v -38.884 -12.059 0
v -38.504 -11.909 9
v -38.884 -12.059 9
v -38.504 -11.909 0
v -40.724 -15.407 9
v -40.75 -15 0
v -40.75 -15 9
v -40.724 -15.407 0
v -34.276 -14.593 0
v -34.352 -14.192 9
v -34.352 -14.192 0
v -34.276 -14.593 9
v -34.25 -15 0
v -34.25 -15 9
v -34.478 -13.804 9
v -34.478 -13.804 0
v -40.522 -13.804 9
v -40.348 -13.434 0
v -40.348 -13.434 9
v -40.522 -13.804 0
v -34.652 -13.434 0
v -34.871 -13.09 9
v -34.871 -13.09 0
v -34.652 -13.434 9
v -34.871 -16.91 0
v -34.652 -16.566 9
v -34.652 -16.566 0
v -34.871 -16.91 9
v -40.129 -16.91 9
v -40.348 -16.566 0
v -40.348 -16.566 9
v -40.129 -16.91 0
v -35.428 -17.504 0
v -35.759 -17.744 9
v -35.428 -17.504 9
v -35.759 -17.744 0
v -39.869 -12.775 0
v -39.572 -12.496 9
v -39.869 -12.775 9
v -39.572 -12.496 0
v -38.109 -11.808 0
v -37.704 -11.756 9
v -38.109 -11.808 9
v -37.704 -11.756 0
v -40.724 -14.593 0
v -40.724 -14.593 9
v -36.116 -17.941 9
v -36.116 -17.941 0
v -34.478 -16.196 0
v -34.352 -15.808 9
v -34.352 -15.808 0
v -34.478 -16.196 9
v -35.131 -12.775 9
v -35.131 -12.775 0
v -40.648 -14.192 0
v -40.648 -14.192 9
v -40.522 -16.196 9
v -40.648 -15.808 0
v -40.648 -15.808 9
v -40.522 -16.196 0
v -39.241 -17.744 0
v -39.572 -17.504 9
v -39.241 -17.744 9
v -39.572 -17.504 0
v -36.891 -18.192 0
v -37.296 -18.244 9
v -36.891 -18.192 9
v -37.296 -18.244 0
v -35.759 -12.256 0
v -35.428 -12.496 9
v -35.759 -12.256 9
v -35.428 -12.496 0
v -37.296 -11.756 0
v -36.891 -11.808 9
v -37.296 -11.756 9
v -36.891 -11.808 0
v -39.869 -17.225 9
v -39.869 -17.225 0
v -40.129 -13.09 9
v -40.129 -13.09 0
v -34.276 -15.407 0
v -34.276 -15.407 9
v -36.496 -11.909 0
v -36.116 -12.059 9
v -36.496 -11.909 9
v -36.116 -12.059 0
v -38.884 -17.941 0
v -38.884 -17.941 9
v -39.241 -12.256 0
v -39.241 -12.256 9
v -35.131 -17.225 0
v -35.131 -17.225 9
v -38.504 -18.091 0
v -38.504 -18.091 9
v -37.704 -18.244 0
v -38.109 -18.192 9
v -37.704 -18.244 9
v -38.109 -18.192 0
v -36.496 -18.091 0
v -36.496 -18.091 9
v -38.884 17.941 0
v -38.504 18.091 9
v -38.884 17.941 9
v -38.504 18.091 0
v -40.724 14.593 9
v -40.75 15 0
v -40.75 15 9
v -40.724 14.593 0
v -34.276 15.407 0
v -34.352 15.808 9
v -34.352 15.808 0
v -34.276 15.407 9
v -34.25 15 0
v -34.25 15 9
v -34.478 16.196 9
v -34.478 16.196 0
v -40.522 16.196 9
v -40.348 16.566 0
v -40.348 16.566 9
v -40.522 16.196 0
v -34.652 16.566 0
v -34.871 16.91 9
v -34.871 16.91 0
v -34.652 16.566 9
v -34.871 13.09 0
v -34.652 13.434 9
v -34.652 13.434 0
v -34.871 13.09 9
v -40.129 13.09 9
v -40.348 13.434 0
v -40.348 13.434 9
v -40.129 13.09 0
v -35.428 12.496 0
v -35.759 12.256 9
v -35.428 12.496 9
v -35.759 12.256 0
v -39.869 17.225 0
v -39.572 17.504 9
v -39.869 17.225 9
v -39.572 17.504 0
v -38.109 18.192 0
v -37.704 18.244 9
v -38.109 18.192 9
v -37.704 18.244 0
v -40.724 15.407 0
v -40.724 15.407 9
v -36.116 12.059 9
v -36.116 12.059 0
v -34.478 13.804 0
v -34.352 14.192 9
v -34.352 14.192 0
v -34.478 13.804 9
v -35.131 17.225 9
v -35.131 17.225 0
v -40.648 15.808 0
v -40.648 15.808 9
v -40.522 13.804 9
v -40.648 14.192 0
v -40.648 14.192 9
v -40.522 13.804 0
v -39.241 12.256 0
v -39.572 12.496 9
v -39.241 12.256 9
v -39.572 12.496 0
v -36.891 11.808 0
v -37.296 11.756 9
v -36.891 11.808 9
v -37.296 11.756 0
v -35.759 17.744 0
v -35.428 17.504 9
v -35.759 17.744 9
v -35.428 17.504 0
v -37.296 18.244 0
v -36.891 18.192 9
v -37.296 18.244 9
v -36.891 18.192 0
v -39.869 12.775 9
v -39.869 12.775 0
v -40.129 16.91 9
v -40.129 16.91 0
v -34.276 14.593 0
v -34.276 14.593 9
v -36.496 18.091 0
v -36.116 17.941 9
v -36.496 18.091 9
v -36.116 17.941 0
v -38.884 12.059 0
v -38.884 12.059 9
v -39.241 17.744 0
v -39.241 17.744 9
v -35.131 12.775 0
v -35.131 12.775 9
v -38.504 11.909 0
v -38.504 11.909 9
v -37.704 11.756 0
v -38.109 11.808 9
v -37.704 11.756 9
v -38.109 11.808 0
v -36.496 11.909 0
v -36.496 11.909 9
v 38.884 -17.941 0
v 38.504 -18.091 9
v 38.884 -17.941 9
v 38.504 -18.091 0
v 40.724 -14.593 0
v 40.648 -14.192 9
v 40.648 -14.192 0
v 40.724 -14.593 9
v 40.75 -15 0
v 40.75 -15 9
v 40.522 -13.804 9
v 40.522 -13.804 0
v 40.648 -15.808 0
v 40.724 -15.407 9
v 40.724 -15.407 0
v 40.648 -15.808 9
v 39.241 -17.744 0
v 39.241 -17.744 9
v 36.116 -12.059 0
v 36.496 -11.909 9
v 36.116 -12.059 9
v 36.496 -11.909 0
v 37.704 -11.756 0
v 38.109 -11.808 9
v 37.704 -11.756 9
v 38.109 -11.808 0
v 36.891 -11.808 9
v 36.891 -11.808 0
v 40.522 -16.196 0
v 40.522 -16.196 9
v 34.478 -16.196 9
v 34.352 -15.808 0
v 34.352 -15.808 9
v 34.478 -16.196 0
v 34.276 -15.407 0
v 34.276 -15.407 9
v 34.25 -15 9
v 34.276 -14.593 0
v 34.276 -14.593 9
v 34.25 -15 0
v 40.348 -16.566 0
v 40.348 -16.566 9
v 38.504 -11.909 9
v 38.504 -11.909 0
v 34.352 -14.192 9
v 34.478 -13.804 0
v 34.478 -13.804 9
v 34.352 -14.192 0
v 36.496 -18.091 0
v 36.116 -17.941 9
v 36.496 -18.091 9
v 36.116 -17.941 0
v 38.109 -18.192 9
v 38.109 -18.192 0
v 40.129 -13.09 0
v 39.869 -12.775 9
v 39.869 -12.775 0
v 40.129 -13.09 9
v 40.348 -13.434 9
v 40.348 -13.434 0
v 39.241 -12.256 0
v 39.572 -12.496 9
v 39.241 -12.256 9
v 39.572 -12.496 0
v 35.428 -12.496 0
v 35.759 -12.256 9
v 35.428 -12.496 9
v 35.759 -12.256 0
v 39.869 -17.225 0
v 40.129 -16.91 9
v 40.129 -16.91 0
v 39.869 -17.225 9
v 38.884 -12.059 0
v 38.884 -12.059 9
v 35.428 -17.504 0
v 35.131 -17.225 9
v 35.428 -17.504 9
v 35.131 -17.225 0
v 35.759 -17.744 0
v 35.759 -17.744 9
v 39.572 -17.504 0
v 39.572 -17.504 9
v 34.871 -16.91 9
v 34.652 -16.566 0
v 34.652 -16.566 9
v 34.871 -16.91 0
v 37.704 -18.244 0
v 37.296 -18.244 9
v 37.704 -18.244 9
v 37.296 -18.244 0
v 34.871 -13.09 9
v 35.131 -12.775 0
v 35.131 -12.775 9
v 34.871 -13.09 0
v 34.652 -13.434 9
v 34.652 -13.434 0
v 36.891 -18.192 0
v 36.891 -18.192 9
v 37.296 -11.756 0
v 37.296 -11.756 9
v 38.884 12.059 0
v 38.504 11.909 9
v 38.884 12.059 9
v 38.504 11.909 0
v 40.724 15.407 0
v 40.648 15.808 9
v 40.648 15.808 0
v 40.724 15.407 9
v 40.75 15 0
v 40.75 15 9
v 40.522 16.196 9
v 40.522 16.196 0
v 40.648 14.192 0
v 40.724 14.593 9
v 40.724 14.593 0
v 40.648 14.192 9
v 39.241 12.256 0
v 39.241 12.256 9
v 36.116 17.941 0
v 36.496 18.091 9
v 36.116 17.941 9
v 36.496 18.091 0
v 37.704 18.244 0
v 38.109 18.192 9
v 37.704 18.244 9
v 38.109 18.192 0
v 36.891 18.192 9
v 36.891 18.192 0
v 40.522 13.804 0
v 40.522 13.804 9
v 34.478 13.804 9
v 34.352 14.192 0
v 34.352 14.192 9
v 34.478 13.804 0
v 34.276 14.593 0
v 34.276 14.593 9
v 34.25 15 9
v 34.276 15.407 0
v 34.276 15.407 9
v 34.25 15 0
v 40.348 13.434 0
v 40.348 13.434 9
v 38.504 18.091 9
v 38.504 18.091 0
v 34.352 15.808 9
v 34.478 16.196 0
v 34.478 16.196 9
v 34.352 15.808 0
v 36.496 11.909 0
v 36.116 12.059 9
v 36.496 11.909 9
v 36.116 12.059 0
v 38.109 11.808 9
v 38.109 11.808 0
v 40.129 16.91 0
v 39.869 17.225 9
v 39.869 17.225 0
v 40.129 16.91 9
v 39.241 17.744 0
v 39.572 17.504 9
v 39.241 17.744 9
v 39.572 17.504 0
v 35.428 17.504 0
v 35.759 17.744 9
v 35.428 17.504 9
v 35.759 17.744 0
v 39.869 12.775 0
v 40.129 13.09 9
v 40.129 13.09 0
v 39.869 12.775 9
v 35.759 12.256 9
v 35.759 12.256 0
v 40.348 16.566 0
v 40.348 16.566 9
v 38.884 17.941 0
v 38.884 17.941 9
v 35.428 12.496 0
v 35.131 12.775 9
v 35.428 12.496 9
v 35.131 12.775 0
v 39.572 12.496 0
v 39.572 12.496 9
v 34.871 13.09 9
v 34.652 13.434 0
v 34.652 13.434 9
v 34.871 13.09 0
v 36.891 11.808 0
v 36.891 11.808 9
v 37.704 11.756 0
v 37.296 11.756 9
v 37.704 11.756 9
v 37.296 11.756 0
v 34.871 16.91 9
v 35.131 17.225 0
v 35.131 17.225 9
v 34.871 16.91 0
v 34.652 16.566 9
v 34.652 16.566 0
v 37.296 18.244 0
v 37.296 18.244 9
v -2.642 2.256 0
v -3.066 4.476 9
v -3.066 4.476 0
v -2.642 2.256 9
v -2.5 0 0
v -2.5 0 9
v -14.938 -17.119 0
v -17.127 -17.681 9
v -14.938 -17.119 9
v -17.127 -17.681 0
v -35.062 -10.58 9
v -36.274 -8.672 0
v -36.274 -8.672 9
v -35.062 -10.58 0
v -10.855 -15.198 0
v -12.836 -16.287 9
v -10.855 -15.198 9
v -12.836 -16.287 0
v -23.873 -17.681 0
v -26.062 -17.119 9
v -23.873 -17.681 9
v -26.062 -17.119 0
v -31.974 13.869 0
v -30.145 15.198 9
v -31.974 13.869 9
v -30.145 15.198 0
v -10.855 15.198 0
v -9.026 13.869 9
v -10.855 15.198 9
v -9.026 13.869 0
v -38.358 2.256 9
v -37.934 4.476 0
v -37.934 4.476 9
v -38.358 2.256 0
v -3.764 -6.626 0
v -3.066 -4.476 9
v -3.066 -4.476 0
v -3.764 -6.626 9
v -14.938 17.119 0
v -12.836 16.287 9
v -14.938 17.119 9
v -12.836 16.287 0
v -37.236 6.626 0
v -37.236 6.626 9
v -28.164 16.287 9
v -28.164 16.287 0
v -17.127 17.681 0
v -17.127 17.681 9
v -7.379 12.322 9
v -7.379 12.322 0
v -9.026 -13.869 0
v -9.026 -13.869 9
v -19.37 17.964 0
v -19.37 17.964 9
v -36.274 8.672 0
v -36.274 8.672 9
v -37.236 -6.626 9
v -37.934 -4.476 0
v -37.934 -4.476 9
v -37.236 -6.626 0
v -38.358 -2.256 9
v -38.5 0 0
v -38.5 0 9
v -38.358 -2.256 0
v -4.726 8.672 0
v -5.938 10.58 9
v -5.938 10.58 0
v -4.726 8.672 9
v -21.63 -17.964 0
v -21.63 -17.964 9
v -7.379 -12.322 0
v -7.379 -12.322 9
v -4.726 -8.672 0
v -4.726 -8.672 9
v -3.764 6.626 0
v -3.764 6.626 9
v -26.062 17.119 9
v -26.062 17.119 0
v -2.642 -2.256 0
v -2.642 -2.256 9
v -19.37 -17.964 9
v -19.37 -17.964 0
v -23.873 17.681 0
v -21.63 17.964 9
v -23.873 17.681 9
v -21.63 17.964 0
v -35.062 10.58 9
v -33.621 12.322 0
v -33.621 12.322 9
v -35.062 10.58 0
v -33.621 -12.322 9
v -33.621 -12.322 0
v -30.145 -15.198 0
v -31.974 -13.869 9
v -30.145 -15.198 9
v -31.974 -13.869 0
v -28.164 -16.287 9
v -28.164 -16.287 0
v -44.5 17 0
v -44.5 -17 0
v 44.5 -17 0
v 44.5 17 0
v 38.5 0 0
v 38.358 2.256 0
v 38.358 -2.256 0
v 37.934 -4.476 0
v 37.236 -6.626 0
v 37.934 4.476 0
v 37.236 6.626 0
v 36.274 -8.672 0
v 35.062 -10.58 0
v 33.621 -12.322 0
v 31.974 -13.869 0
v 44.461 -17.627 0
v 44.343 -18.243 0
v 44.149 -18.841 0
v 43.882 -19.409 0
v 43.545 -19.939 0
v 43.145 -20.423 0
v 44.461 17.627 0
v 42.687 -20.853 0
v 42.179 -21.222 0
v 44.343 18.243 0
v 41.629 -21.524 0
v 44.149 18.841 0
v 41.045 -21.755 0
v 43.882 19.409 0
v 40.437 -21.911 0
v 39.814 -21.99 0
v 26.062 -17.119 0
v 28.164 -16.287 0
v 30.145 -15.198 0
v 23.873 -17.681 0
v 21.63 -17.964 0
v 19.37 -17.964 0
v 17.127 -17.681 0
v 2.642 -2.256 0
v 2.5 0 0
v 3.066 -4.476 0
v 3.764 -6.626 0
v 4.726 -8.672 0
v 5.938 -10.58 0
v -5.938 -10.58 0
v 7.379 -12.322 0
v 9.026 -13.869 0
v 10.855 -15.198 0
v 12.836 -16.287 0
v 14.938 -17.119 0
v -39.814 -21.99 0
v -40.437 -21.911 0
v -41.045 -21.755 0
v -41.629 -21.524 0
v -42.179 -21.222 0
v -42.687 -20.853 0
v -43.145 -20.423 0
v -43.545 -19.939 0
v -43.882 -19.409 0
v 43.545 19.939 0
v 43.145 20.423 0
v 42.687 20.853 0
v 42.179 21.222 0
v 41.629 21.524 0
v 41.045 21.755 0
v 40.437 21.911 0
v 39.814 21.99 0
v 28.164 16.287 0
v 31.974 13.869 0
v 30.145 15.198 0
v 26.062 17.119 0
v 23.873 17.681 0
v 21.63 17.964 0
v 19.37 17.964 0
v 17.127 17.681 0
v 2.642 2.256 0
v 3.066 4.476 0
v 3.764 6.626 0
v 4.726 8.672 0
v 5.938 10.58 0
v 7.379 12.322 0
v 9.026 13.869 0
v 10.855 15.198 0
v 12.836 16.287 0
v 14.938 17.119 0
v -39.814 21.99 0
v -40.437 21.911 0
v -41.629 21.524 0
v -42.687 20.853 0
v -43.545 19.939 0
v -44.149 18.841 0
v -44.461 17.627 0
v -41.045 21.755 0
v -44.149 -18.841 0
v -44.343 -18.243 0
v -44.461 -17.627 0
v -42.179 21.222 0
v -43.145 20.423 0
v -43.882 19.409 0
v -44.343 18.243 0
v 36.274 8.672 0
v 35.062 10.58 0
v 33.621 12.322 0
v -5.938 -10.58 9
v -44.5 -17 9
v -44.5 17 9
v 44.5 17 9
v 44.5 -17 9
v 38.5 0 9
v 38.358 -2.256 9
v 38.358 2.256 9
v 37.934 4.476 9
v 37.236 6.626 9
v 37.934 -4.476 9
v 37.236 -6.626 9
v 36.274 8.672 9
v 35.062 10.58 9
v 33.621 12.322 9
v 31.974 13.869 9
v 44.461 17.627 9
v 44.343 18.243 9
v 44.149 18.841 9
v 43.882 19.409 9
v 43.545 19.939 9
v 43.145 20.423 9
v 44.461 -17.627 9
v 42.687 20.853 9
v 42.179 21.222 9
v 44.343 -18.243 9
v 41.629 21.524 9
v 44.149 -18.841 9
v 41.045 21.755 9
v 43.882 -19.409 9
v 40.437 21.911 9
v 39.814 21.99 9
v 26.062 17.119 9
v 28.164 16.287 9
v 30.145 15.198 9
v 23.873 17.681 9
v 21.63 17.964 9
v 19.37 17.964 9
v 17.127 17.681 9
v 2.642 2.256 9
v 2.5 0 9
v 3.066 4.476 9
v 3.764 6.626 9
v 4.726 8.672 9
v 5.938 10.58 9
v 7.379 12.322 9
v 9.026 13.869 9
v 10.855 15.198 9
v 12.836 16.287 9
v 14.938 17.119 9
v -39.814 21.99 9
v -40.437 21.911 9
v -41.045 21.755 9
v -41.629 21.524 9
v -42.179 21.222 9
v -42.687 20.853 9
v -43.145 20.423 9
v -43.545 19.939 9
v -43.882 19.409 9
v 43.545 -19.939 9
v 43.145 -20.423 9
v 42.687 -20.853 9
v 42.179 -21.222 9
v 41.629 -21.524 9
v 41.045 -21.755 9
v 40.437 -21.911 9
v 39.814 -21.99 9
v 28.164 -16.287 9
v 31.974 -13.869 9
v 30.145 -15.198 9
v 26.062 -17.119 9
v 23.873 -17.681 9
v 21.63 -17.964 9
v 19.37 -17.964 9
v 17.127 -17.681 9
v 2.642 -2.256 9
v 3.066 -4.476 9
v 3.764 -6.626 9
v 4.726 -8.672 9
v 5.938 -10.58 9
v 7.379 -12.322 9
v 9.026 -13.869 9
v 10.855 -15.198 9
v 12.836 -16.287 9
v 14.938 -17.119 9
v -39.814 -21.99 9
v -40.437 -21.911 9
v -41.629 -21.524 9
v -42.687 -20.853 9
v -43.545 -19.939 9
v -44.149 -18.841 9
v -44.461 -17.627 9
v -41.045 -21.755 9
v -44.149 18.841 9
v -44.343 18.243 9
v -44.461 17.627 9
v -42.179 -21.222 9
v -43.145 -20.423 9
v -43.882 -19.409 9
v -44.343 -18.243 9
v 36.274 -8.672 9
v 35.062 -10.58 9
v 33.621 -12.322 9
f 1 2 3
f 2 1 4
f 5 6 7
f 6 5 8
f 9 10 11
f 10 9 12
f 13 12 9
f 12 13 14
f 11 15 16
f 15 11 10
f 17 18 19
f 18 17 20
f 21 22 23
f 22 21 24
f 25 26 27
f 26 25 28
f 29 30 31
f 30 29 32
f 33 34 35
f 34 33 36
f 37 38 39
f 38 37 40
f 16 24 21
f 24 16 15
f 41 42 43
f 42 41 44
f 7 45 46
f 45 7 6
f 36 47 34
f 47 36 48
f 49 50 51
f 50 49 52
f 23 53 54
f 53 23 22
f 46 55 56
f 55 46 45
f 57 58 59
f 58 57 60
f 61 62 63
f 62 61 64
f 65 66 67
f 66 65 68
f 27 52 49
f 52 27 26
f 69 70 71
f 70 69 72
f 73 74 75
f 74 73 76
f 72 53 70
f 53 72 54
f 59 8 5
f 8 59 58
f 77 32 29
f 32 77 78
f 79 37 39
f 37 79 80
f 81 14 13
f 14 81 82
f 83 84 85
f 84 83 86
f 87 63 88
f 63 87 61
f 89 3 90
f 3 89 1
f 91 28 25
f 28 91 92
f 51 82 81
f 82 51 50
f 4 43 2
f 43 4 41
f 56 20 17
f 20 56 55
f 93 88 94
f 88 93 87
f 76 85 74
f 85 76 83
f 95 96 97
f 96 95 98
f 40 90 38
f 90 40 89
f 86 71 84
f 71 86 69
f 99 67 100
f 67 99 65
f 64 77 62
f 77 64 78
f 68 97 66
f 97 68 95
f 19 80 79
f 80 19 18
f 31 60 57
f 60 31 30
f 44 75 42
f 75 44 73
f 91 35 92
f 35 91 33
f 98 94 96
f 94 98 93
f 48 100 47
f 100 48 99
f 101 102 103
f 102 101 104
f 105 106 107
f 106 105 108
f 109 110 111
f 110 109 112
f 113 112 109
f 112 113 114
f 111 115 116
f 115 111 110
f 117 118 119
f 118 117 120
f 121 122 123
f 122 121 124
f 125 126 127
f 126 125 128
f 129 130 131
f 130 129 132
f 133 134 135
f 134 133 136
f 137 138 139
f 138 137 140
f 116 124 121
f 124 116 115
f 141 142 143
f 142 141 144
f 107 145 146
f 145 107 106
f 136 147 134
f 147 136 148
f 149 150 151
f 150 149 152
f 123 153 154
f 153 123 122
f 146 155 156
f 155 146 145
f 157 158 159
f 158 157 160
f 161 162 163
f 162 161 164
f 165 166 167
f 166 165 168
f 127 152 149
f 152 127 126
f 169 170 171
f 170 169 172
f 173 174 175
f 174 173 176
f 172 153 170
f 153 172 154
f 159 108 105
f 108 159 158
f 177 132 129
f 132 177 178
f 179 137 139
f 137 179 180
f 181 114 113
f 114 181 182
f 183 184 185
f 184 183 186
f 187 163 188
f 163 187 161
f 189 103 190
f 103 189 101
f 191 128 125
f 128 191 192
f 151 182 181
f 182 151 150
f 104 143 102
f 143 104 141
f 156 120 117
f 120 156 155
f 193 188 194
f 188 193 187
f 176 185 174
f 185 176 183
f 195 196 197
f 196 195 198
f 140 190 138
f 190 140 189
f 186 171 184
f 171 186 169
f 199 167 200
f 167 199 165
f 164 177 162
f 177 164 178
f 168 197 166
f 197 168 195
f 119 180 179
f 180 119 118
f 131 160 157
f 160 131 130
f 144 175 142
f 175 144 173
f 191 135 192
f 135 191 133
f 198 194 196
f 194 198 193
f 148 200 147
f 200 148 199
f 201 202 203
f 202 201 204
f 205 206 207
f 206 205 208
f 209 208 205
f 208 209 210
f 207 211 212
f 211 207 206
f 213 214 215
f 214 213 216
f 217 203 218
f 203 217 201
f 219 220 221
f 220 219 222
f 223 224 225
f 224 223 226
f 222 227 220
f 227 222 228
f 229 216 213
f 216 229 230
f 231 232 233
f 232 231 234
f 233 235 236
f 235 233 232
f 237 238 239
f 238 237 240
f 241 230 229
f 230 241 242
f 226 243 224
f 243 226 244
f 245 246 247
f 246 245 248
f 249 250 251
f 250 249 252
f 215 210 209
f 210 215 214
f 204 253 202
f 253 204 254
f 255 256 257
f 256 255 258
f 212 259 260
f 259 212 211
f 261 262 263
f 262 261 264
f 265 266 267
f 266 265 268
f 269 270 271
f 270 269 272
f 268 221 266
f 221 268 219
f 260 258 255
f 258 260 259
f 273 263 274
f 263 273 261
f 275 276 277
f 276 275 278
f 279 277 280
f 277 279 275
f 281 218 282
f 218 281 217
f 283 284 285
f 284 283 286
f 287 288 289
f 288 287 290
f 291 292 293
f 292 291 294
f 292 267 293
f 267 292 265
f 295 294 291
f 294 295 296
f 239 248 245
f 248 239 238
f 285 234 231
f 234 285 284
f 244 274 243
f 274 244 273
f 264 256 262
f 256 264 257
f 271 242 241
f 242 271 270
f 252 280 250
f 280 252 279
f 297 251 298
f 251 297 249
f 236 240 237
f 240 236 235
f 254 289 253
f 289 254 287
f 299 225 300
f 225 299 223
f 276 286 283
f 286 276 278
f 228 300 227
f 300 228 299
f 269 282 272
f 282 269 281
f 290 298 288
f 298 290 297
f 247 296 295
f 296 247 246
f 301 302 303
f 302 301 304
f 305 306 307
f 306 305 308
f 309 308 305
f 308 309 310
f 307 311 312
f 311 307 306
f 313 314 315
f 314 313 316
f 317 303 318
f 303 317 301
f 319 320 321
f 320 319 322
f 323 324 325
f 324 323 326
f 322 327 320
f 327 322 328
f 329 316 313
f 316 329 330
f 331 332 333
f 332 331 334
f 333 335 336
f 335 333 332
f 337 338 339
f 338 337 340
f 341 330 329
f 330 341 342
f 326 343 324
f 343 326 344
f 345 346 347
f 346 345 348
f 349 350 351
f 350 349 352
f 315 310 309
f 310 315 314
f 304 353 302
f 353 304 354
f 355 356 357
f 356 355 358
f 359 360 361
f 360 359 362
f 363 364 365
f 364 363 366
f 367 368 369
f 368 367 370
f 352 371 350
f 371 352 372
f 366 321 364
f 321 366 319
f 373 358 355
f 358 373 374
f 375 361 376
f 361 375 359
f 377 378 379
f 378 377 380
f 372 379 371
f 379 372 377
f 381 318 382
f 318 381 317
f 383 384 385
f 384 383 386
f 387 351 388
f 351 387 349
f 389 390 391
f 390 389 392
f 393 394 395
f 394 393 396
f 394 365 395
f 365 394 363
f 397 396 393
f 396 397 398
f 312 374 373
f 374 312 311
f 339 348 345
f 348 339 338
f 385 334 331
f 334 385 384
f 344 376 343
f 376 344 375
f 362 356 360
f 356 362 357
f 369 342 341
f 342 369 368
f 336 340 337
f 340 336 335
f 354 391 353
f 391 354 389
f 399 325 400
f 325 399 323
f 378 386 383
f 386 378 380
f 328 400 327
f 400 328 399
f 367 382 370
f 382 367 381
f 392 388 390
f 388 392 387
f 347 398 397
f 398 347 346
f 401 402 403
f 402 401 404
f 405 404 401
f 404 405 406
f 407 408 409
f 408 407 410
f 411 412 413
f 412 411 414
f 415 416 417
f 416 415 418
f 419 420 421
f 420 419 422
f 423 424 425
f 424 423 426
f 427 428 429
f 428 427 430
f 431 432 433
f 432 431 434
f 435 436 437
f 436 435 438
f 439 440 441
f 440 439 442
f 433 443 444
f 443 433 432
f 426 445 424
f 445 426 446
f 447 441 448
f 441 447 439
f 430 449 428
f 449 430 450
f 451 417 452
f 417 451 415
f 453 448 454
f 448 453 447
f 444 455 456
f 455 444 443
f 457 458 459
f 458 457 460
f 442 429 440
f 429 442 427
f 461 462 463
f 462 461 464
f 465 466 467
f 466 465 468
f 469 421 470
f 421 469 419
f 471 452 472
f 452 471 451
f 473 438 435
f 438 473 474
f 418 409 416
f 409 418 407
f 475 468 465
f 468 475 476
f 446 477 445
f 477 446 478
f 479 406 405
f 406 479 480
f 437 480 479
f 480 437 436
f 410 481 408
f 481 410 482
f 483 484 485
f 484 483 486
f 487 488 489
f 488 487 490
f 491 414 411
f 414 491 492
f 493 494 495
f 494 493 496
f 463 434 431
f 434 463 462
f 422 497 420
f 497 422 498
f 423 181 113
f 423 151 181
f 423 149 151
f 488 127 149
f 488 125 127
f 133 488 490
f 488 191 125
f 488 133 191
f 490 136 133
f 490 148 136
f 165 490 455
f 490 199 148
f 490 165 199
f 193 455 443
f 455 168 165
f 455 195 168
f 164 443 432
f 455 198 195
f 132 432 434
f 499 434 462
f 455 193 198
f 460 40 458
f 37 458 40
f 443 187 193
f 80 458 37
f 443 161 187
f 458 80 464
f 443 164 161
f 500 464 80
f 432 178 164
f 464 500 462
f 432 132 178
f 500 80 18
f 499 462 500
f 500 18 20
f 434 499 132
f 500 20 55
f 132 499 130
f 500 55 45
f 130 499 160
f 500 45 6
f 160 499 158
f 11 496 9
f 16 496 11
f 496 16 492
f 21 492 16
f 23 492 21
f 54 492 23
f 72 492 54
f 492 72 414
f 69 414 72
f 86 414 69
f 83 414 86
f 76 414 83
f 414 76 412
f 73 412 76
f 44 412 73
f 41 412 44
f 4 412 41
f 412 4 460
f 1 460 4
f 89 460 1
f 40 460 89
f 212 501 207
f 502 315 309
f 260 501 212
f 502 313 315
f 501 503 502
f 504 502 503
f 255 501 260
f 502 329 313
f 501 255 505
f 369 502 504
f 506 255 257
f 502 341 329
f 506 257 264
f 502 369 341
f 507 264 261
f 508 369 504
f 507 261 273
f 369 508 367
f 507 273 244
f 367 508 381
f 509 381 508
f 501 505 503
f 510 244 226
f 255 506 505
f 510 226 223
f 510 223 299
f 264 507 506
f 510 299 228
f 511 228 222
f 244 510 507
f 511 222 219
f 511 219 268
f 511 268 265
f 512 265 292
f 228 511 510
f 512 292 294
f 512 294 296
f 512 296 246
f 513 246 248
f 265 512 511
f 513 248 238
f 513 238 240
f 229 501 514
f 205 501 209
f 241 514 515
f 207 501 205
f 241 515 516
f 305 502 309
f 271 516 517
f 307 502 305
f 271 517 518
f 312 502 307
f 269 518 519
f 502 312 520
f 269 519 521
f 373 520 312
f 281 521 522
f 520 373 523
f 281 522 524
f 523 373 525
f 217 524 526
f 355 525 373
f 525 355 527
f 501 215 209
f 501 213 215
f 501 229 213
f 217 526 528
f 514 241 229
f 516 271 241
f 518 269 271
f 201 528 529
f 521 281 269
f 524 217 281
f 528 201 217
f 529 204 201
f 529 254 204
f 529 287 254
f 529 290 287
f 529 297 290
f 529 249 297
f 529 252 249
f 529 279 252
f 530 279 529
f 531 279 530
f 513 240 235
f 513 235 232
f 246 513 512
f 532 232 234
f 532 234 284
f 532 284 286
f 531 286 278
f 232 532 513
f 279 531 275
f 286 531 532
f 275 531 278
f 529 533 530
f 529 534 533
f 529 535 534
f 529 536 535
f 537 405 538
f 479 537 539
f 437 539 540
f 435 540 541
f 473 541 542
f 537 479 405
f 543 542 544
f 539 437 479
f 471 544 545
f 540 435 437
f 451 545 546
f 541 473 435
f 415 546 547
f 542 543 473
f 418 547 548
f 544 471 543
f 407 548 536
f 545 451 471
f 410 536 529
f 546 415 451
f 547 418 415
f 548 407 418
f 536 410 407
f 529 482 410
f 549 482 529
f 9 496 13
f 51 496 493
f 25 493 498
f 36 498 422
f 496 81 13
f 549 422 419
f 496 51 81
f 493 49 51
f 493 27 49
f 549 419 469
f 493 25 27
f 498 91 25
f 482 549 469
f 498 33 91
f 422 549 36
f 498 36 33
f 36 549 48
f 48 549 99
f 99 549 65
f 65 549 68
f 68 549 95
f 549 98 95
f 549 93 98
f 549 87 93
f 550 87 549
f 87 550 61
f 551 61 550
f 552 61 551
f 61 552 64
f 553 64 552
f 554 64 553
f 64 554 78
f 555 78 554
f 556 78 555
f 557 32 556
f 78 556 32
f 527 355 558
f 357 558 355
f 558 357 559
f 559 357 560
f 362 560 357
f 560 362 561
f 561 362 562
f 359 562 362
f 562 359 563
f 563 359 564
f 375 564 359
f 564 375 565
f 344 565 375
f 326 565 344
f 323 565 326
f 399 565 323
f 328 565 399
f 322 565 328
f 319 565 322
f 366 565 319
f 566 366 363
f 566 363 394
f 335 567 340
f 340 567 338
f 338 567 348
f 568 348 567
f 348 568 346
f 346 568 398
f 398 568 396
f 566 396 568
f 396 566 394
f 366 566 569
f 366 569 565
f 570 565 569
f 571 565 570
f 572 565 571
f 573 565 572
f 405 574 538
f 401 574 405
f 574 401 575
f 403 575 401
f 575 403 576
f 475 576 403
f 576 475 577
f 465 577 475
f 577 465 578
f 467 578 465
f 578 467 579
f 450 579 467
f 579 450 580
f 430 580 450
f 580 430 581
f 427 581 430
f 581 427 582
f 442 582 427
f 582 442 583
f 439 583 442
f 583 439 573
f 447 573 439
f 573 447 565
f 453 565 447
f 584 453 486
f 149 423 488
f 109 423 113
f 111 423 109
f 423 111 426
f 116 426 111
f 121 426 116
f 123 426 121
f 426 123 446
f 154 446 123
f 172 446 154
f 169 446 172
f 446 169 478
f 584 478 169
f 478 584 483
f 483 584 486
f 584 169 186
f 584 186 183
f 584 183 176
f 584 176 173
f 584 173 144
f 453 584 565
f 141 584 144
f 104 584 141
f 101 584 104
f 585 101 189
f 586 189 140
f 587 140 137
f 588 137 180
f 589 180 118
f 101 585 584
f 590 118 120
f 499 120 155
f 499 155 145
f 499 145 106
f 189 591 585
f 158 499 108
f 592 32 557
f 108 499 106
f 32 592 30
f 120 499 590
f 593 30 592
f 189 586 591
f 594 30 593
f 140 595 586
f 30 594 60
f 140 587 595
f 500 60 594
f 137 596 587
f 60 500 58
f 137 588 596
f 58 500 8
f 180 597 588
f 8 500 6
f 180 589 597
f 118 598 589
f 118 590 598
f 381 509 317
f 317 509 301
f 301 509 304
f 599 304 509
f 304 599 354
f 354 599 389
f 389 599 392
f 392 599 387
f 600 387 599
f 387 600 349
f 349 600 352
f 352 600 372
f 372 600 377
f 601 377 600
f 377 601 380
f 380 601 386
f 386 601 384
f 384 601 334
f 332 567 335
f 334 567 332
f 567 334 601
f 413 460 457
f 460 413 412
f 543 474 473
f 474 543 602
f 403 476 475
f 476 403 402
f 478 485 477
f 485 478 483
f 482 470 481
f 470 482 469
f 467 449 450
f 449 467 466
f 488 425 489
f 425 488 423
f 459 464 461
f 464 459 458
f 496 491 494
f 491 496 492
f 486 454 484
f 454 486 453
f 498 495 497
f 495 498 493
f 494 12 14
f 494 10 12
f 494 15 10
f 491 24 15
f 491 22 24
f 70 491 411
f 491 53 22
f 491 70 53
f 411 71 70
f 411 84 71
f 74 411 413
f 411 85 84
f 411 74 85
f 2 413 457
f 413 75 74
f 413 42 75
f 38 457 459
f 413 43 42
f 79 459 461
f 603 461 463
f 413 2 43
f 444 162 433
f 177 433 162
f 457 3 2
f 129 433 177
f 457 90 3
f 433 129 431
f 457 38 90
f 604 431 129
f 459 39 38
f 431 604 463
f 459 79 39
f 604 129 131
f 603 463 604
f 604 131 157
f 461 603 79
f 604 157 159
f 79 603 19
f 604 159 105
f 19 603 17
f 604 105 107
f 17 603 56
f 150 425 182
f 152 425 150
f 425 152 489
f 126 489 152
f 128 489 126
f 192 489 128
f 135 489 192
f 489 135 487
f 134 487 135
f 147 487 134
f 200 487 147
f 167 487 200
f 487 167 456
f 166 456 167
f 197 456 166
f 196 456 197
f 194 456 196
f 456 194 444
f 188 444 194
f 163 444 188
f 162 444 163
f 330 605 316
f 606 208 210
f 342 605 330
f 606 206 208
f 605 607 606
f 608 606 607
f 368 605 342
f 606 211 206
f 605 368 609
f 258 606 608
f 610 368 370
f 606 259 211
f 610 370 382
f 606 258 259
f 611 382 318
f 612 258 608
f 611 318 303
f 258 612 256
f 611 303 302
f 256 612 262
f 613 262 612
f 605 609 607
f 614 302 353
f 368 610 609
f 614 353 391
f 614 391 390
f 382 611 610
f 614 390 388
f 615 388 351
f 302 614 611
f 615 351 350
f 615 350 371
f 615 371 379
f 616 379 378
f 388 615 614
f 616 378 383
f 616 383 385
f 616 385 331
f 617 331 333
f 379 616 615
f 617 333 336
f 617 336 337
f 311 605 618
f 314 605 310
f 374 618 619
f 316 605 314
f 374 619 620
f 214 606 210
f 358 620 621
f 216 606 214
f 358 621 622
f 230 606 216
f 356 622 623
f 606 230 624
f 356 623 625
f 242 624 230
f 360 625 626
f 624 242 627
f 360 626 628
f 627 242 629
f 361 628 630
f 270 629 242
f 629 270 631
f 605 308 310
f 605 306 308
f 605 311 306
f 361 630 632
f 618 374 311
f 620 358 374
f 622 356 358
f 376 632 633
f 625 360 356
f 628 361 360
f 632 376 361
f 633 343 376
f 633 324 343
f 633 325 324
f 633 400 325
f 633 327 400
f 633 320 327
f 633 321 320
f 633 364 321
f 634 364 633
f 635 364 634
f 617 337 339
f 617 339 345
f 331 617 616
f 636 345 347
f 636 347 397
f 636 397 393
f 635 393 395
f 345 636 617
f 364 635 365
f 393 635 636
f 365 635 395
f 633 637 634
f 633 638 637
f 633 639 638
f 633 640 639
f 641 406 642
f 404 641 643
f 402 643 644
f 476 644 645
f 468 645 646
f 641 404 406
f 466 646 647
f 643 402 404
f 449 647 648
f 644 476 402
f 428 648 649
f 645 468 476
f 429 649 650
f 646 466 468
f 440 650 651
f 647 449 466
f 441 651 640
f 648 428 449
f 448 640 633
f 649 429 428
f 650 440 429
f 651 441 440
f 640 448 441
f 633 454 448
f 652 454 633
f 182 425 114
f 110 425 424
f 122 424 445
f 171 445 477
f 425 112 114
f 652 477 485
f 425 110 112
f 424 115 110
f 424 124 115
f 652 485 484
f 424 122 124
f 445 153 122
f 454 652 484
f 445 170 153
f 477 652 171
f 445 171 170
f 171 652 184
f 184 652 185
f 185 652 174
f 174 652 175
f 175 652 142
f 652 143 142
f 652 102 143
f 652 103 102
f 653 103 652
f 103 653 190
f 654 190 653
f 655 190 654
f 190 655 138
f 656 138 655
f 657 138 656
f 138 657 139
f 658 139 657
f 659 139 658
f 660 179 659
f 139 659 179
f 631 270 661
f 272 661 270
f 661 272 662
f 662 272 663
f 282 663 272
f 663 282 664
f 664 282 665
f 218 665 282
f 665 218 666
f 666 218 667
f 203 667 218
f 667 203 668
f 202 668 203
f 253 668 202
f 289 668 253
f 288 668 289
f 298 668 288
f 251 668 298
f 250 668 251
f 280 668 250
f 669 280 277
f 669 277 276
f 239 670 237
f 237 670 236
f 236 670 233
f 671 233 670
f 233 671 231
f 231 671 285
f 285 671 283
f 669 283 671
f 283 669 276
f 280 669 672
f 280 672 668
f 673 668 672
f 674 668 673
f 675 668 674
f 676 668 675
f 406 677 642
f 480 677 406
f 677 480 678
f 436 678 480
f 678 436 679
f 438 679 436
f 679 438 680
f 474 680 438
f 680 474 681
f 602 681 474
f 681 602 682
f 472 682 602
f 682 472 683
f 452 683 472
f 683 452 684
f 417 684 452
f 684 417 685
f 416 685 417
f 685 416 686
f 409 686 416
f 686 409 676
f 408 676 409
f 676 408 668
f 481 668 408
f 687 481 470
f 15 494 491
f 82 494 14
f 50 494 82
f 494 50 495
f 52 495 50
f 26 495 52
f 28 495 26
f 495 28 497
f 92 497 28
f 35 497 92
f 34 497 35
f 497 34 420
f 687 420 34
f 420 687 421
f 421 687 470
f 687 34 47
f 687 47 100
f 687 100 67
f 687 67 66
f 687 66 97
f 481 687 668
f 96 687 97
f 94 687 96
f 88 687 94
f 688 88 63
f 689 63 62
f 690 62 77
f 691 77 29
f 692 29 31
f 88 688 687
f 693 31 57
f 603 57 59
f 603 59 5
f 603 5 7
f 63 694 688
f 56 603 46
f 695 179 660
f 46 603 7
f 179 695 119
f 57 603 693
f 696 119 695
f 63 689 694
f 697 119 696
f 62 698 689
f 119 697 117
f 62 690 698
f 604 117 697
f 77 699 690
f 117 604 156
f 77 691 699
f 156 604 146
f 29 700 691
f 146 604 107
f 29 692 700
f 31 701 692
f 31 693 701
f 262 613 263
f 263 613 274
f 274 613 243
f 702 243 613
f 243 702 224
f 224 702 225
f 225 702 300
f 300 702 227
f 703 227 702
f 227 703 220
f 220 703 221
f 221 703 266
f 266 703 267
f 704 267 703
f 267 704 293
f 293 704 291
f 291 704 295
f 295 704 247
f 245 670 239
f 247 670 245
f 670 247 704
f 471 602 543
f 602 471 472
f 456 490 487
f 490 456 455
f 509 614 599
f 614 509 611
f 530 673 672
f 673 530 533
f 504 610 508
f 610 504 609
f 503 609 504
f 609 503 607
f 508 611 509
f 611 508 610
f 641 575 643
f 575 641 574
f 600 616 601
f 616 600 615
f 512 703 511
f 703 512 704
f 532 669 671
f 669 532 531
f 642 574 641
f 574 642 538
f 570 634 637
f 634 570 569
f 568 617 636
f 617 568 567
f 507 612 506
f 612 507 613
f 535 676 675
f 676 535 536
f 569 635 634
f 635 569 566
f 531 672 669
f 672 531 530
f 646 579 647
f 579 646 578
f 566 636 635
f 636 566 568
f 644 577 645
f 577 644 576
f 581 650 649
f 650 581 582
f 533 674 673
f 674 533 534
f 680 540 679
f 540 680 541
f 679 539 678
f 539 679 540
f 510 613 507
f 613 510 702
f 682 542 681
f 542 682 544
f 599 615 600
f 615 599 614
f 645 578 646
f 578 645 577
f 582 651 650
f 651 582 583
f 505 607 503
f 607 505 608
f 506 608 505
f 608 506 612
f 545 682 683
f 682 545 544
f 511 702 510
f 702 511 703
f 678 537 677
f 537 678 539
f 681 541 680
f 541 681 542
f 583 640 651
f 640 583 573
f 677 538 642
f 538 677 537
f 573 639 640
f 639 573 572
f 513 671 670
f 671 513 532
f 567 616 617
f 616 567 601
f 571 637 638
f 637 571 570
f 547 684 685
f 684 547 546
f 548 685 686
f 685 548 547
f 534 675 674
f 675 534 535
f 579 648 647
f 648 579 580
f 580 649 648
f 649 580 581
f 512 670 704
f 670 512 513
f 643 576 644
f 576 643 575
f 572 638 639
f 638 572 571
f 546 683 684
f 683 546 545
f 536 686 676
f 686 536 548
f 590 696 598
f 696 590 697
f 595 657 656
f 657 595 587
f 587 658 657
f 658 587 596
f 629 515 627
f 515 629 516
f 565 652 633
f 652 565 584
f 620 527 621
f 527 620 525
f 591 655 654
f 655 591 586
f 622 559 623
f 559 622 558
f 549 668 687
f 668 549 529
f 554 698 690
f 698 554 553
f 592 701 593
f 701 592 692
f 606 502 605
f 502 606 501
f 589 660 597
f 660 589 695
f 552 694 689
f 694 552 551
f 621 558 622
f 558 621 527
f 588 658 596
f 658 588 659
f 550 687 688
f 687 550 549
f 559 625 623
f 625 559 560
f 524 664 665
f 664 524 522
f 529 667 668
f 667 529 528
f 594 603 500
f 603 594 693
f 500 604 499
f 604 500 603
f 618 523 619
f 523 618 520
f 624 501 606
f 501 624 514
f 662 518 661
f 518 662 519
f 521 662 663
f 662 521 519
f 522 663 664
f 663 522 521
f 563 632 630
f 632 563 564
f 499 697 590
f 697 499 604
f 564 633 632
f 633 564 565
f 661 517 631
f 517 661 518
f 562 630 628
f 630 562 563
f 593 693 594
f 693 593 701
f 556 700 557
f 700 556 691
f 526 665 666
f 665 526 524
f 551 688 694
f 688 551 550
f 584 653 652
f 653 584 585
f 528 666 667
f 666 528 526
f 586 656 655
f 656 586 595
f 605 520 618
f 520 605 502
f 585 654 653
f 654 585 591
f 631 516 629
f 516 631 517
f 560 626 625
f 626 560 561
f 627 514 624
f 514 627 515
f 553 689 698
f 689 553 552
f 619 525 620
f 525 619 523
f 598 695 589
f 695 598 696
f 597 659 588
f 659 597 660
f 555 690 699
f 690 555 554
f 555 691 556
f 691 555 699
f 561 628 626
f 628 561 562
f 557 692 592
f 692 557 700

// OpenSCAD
$fn = 50;


difference() {
	union() {
		hull() {
			translate(v = [-39.5000000000, 17.0000000000, 0]) {
				cylinder(h = 9, r = 5);
			}
			translate(v = [39.5000000000, 17.0000000000, 0]) {
				cylinder(h = 9, r = 5);
			}
			translate(v = [-39.5000000000, -17.0000000000, 0]) {
				cylinder(h = 9, r = 5);
			}
			translate(v = [39.5000000000, -17.0000000000, 0]) {
				cylinder(h = 9, r = 5);
			}
		}
	}
	union() {
		#translate(v = [-37.5000000000, -15.0000000000, -100.0000000000]) {
			cylinder(h = 200, r = 3.2500000000);
		}
		#translate(v = [-37.5000000000, 15.0000000000, -100.0000000000]) {
			cylinder(h = 200, r = 3.2500000000);
		}
		#translate(v = [37.5000000000, -15.0000000000, -100.0000000000]) {
			cylinder(h = 200, r = 3.2500000000);
		}
		#translate(v = [37.5000000000, 15.0000000000, -100.0000000000]) {
			cylinder(h = 200, r = 3.2500000000);
		}
		#translate(v = [-20.5000000000, 0, 0]) {
			cylinder(h = 9, r = 18.0000000000);
		}
		#translate(v = [20.5000000000, 0, 0]) {
			cylinder(h = 9, r = 18.0000000000);
		}
	}
}
